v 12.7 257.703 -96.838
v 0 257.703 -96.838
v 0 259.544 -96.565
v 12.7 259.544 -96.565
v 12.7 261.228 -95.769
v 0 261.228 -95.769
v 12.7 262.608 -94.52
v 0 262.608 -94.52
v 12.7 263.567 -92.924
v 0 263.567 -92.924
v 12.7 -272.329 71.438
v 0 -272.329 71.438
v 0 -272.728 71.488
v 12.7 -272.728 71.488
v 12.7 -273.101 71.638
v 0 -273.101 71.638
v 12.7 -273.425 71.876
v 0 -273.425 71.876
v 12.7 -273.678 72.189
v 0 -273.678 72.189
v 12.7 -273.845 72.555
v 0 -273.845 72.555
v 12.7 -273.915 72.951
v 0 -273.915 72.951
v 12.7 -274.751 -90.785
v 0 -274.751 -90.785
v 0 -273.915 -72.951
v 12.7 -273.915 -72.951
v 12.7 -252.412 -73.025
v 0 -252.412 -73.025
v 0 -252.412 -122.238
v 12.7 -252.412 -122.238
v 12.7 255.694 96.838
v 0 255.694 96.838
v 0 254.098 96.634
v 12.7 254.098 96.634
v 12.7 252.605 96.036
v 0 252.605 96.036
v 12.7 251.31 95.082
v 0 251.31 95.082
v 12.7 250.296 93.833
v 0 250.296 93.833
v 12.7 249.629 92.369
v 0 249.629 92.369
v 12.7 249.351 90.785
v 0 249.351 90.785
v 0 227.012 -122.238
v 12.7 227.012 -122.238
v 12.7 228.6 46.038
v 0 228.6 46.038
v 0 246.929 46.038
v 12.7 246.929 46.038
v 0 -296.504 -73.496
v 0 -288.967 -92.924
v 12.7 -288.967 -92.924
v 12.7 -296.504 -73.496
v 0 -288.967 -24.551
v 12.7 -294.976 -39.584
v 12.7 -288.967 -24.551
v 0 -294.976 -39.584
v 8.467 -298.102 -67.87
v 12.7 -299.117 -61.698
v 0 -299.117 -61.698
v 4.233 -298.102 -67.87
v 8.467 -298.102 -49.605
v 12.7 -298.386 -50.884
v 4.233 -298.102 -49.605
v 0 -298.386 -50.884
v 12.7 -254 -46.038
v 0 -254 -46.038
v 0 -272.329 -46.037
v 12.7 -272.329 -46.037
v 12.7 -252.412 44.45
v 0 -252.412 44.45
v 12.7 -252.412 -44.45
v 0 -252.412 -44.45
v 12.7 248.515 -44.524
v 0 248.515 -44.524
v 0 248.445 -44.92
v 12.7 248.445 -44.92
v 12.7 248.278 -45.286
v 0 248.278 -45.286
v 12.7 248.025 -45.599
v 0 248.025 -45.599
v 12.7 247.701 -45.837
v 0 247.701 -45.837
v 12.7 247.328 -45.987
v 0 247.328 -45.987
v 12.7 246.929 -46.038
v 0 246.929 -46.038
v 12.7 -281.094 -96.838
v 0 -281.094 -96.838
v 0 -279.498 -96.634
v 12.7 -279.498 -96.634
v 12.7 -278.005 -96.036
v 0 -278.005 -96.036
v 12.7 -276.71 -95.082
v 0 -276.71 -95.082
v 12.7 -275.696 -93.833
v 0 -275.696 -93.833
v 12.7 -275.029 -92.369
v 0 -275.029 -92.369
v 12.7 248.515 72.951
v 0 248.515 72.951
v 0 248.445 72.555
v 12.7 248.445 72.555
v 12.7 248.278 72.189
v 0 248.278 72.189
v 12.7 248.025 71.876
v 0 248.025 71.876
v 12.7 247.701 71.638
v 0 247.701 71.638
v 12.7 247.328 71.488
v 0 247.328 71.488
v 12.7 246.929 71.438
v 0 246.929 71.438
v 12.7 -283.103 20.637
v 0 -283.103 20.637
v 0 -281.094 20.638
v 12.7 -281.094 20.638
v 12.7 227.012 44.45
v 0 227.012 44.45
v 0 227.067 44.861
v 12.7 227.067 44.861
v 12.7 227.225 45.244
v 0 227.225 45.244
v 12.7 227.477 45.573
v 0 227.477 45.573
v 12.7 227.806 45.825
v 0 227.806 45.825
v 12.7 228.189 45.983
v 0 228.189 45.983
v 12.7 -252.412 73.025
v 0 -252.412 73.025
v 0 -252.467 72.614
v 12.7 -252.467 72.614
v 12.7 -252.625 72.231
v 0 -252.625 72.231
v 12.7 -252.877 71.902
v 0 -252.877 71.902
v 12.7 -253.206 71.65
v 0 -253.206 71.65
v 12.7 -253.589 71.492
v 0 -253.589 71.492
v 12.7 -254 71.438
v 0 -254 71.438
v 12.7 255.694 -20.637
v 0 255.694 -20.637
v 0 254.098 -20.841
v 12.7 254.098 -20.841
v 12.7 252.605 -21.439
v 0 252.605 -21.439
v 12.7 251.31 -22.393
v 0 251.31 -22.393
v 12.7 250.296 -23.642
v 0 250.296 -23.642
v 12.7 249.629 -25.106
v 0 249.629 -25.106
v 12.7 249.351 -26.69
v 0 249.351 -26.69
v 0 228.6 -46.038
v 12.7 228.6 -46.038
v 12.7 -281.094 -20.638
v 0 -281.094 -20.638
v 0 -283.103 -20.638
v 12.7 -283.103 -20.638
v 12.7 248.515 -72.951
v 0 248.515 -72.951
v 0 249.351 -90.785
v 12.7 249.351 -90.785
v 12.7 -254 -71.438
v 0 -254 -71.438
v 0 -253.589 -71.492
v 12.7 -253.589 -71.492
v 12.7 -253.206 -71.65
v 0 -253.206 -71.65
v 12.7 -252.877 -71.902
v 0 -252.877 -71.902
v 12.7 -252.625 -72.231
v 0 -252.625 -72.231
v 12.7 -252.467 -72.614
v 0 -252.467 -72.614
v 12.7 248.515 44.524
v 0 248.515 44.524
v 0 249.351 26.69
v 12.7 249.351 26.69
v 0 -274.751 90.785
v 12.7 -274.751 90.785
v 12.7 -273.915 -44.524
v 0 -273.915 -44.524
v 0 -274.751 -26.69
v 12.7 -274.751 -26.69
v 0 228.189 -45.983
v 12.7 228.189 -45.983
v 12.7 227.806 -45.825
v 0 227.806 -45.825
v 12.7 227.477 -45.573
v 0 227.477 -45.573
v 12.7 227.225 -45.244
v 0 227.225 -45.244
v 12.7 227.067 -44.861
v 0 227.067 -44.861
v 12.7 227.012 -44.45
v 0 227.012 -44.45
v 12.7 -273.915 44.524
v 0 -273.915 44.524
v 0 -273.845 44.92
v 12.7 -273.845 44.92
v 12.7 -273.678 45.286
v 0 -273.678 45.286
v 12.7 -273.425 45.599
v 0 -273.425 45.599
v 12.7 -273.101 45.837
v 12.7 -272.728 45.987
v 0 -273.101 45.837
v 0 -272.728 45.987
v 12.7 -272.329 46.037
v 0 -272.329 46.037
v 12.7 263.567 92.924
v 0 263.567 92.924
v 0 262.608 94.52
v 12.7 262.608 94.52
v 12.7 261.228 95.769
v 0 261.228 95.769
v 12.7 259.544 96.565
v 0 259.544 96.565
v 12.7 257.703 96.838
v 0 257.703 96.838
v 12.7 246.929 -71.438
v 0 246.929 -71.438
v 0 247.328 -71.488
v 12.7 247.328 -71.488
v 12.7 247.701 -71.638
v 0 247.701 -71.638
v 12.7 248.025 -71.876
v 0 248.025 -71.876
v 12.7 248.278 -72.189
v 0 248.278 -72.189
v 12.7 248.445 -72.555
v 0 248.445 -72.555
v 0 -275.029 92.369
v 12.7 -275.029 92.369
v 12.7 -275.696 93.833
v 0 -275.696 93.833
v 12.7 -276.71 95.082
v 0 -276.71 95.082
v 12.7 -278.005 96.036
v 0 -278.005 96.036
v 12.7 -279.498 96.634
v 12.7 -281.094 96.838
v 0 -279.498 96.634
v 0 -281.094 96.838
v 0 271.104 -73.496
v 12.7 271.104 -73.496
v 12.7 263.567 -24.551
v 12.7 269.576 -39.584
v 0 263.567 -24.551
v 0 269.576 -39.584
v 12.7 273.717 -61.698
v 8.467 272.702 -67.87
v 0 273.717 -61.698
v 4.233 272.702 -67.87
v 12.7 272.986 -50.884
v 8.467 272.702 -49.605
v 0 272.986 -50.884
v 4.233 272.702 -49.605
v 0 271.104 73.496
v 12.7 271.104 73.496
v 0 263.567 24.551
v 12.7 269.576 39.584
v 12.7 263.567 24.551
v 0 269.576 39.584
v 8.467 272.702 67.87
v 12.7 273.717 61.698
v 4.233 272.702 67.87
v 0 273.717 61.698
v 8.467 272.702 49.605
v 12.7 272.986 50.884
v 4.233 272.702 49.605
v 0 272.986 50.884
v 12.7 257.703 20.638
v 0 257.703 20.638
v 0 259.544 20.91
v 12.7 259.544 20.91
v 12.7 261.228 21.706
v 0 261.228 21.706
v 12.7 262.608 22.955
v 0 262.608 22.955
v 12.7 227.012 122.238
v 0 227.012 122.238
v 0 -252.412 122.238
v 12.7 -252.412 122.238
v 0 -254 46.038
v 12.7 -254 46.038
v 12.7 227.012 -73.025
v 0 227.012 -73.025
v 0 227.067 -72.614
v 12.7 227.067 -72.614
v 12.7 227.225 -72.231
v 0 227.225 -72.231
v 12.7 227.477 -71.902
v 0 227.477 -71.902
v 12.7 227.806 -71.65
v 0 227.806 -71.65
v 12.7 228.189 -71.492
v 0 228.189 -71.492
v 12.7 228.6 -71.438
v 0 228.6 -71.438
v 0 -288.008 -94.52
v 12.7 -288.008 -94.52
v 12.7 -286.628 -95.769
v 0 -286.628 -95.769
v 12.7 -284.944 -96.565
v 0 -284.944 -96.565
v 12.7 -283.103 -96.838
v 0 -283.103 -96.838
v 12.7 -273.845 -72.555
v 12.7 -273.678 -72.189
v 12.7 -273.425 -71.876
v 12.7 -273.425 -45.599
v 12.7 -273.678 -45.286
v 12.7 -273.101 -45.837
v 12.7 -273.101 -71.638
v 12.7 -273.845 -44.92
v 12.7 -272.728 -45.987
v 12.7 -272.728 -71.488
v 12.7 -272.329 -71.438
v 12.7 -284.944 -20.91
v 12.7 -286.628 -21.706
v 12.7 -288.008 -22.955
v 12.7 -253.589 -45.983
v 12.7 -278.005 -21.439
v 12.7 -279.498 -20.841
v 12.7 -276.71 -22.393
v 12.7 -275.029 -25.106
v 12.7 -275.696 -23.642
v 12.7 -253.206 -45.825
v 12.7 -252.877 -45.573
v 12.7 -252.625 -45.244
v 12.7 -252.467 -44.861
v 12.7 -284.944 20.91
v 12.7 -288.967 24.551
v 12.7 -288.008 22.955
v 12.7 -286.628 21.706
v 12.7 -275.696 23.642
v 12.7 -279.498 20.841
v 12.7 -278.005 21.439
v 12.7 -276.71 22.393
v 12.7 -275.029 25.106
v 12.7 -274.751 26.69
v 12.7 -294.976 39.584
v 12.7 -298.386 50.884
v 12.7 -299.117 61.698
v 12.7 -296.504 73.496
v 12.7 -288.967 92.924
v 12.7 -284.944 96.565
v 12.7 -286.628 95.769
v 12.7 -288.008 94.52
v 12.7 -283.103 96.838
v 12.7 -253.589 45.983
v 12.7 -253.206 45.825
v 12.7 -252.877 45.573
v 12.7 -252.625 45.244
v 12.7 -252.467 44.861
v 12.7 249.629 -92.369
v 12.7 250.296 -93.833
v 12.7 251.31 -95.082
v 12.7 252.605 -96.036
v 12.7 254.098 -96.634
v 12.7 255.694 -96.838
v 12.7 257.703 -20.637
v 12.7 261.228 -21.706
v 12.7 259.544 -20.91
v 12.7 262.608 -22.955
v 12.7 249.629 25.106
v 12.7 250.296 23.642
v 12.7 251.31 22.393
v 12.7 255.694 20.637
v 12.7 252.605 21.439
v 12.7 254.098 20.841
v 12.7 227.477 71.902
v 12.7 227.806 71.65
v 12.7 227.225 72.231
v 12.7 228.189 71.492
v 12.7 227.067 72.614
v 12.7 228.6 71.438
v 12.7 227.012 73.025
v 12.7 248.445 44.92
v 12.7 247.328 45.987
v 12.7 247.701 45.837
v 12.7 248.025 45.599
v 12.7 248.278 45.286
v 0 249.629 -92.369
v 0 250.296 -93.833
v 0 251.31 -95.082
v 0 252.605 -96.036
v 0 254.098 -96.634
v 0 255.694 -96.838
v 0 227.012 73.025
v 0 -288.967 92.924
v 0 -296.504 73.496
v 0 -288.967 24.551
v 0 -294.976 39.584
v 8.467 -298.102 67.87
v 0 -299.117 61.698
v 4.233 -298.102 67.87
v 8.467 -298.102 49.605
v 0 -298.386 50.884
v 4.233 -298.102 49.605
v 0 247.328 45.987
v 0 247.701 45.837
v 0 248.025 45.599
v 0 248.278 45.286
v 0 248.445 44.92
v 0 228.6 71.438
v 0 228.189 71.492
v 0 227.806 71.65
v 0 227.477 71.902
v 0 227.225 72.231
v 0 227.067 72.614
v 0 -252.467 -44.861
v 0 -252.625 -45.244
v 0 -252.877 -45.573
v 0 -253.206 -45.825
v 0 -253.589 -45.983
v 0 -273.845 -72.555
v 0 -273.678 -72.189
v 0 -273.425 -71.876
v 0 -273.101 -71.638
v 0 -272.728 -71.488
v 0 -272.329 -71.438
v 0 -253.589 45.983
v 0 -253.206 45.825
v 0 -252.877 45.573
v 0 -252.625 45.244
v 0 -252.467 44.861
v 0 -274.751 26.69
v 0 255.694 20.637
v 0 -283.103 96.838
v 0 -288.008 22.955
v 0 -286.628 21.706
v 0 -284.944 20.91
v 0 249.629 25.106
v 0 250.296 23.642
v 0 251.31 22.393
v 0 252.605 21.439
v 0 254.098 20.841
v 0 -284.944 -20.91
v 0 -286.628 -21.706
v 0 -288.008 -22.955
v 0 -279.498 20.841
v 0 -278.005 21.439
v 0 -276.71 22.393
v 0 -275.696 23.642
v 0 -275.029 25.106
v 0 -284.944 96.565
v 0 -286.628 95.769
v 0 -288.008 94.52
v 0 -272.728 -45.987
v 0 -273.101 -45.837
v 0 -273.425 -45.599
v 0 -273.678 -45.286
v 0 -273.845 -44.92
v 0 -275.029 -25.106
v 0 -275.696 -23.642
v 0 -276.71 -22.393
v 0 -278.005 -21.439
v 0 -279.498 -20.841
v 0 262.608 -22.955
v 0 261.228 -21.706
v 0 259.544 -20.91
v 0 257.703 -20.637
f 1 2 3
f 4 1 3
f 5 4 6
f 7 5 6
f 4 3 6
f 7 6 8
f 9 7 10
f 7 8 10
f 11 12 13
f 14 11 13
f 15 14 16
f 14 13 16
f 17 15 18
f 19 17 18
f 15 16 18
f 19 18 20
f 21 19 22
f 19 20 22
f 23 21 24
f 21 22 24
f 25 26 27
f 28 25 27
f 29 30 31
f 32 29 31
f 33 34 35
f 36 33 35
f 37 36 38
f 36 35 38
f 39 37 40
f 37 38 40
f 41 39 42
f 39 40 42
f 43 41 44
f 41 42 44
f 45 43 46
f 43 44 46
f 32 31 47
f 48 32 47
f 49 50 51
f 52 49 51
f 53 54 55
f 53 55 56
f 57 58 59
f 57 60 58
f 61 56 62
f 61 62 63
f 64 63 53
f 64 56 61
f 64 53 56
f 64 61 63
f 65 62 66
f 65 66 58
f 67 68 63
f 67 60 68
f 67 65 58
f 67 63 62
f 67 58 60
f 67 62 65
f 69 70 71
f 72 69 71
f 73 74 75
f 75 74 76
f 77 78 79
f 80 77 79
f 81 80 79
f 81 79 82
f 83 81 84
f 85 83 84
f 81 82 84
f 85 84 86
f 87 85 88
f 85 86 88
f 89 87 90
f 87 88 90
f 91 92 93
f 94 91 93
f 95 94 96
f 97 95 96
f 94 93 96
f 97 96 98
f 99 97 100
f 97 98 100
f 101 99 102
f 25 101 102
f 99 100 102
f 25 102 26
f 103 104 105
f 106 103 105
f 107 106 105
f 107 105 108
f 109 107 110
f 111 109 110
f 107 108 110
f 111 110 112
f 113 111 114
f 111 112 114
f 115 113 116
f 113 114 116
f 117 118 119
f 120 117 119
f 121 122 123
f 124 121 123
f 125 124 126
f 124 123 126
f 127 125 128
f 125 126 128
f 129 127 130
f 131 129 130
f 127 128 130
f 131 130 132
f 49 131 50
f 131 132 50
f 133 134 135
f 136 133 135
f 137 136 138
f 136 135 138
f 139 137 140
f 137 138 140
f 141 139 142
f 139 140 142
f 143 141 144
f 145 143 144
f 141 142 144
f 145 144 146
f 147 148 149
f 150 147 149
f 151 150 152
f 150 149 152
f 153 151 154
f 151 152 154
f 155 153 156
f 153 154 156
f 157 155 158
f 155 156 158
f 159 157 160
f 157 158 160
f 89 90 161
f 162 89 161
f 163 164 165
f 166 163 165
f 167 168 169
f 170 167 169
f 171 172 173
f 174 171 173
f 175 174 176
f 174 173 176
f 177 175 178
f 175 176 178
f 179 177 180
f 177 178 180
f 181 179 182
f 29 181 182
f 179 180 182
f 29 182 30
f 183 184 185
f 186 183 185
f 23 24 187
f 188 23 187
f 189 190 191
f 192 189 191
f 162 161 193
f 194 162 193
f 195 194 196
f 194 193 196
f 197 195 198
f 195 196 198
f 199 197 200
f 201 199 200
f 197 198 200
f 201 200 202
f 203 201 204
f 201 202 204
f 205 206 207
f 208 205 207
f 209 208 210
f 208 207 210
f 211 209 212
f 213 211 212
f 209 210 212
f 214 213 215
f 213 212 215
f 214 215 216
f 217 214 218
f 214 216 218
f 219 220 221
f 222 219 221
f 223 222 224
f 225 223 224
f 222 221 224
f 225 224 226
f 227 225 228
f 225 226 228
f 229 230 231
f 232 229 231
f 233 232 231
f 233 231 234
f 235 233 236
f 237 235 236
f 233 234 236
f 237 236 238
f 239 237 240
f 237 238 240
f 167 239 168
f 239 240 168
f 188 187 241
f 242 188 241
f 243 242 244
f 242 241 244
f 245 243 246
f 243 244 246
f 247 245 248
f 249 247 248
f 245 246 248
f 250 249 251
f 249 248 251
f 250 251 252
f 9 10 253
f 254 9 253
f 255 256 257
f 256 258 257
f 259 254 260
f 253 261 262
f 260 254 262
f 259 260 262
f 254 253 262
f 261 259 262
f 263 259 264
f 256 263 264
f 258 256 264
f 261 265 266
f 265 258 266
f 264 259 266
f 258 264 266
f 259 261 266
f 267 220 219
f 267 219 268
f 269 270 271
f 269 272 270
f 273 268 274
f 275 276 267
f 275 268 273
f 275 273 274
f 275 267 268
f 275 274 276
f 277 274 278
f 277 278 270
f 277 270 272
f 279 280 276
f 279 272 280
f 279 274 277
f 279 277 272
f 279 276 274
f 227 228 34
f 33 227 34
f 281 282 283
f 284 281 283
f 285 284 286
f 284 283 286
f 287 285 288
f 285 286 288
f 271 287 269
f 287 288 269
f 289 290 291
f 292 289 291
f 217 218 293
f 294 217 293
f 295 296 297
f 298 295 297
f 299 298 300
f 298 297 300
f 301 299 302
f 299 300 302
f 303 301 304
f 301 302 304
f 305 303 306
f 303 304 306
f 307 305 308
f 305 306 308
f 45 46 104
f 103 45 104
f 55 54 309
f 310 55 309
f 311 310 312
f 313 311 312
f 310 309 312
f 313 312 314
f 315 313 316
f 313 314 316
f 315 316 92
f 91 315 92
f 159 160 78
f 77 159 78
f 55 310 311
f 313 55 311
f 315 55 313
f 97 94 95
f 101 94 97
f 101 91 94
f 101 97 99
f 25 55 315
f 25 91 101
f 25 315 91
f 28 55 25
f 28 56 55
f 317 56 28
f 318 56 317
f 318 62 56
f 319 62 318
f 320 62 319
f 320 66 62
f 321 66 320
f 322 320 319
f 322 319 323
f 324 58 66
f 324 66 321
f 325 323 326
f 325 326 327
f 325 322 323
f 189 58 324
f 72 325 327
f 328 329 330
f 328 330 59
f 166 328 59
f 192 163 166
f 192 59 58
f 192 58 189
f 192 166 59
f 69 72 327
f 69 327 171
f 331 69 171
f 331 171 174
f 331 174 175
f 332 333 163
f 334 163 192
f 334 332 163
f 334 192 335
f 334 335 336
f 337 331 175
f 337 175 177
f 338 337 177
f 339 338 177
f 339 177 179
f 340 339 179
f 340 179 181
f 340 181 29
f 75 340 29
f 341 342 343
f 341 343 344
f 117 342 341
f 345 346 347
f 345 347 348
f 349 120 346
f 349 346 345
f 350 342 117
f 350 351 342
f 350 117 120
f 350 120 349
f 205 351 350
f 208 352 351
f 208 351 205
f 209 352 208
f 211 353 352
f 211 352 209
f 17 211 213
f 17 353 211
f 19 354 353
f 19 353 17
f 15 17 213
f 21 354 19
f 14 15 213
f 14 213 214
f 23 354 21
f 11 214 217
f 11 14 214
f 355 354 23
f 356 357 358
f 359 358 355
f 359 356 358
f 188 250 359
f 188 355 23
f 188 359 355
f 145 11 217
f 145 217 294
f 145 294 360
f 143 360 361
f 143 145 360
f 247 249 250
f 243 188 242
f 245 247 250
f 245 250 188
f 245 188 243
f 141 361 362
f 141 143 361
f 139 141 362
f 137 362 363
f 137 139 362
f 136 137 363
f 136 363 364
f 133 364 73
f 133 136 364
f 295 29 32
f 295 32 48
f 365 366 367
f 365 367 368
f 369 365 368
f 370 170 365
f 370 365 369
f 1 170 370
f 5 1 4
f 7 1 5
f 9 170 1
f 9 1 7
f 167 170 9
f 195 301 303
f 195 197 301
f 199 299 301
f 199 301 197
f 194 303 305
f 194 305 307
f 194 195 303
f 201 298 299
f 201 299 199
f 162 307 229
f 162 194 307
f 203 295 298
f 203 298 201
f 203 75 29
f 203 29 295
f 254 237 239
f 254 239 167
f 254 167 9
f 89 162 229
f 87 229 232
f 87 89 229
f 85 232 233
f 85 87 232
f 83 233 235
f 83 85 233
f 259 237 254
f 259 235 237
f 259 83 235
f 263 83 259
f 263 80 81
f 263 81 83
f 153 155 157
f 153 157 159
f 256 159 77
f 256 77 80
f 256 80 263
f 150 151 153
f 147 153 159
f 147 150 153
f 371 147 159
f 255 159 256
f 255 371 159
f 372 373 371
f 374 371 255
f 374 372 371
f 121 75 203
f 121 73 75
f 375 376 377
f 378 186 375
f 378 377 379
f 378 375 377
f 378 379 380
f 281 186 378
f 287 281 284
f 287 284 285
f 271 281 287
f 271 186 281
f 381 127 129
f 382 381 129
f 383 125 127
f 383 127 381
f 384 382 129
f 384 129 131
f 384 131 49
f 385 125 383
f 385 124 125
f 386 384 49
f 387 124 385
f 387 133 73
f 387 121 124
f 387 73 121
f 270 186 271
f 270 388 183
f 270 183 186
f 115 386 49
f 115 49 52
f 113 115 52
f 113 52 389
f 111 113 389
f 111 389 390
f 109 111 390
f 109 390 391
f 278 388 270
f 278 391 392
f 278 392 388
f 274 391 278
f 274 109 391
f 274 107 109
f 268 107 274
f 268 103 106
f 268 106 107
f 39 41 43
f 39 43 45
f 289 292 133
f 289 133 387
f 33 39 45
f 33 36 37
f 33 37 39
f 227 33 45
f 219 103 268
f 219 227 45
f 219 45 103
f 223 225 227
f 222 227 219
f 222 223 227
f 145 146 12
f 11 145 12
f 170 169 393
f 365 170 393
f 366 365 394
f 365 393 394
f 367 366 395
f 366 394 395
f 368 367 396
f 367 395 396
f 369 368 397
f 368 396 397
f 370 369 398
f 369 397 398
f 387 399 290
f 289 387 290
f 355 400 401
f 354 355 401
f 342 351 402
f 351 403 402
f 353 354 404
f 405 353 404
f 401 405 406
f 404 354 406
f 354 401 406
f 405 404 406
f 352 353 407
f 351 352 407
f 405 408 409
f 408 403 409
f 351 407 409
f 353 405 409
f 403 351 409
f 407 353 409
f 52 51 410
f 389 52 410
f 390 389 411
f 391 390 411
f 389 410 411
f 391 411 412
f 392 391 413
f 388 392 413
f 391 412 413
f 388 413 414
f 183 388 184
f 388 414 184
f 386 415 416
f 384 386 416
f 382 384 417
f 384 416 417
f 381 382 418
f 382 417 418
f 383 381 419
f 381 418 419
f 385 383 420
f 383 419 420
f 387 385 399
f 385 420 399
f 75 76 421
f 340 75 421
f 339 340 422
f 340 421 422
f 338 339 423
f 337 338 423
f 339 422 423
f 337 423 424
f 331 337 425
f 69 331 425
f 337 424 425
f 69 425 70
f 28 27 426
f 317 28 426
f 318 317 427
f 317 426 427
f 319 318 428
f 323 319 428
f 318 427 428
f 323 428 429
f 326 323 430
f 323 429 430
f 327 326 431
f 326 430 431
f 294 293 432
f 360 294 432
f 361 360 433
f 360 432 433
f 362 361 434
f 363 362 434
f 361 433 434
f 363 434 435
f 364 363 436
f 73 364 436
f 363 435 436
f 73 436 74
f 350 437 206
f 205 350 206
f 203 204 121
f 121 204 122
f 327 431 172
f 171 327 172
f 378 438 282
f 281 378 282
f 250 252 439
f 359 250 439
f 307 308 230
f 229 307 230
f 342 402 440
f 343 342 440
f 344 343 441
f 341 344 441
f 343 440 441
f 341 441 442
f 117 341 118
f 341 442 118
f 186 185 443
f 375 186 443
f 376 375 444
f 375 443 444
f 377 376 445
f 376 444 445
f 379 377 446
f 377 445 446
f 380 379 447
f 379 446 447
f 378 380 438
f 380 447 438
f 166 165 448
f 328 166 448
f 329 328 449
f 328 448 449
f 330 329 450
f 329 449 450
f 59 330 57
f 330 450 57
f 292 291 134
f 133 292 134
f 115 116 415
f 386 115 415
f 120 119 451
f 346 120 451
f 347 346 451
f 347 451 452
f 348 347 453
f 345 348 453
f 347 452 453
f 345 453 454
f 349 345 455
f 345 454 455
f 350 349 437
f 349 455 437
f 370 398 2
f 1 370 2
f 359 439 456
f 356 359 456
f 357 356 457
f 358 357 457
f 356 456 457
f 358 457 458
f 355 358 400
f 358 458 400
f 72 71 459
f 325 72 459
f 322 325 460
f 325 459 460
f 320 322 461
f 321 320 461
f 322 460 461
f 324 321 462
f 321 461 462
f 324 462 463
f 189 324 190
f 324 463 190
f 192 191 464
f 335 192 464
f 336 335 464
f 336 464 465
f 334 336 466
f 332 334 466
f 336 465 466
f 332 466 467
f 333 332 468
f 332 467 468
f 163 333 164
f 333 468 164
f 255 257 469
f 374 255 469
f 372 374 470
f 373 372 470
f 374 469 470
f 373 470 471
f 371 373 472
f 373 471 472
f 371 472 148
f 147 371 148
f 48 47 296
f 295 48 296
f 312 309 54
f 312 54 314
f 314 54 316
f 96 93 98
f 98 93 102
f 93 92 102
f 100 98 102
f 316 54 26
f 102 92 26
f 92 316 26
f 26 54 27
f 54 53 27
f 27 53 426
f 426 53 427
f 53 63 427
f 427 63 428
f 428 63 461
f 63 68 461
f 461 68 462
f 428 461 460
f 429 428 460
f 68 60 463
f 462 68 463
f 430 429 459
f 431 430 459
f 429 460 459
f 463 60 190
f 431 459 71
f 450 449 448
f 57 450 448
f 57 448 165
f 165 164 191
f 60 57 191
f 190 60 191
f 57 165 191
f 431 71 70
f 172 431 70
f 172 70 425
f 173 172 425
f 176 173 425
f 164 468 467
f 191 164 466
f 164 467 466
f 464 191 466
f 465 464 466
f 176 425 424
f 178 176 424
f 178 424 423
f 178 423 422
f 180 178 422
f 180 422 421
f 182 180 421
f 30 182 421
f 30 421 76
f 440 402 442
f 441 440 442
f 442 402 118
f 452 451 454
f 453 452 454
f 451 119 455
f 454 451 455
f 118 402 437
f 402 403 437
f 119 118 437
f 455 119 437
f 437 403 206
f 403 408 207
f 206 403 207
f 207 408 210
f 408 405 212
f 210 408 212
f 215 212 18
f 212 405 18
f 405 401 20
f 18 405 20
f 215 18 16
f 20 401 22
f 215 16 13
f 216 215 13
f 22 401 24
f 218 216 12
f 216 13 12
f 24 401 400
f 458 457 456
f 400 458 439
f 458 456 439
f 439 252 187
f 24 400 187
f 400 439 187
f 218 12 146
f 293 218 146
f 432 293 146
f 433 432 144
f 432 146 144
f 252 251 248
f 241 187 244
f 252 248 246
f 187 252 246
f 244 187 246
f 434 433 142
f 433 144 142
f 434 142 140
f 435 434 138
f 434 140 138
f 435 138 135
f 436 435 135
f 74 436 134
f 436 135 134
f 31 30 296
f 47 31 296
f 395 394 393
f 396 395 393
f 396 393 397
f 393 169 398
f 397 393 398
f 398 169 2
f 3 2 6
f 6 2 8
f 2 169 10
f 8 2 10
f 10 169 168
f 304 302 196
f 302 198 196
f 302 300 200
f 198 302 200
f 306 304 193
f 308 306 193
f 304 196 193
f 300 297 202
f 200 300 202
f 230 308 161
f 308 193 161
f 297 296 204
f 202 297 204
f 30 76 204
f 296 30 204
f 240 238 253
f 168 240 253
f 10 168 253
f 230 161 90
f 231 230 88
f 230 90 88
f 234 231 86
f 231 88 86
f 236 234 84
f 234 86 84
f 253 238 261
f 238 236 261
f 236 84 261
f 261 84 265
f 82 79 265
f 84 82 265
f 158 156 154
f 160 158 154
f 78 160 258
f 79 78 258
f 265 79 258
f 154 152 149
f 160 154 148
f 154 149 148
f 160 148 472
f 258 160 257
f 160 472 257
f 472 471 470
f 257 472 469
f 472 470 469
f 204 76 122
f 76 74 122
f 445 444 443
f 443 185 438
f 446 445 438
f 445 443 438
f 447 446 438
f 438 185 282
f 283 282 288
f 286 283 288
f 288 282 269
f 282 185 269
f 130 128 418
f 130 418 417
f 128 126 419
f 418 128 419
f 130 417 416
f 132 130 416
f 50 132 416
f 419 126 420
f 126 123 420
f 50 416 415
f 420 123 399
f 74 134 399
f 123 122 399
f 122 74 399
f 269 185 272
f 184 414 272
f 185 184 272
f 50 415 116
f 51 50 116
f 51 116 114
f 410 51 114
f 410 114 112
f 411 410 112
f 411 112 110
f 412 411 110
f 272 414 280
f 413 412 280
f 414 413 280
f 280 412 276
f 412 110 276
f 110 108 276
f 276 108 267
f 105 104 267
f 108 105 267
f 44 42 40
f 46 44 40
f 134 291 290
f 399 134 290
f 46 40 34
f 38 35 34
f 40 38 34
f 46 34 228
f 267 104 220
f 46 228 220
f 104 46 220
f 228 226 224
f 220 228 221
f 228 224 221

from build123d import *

# Parameters (mm, degrees)
F1_DEPTH = 12.7


with BuildPart() as f1:
    # F0 (on Right) → F1 (new body)
    with BuildSketch(Plane.YZ):
        with BuildLine():
            ThreePointArc((-274.750656, 90.78483), (-276.709945, 95.081547), (-281.093691, 96.8375))
            Line((-281.093691, 96.8375), (-283.102754, 96.8375))
            ThreePointArc((-283.102754, 96.8375), (-286.627633, 95.76933), (-288.966632, 92.924185))
            add(Edge.make_bspline(
                [(-288.966632, 92.924185), (-302.669456, 59.948361), (-302.669456, 57.526639), (-288.966632, 24.550815)],
                knots=[2.702454, 2.702454, 2.702454, 2.702454, 73.497546, 73.497546, 73.497546, 73.497546], degree=3))
            ThreePointArc((-288.966632, 24.550815), (-286.627633, 21.70567), (-283.102754, 20.6375))
            Line((-283.102754, 20.6375), (-281.093691, 20.6375))
            ThreePointArc((-281.093691, 20.6375), (-276.709945, 22.393453), (-274.750656, 26.69017))
            Line((-274.750656, 26.69017), (-273.91468, 44.524332))
            ThreePointArc((-273.91468, 44.524332), (-273.424857, 45.598512), (-272.328921, 46.0375))
            Line((-272.328921, 46.0375), (-254, 46.0375))
            ThreePointArc((-254, 46.0375), (-252.877468, 45.572532), (-252.4125, 44.45))
            Line((-252.4125, 44.45), (-252.4125, -44.45))
            ThreePointArc((-252.4125, -44.45), (-252.877468, -45.572532), (-254, -46.0375))
            Line((-254, -46.0375), (-272.328921, -46.0375))
            ThreePointArc((-272.328921, -46.0375), (-273.424857, -45.598512), (-273.91468, -44.524332))
            Line((-273.91468, -44.524332), (-274.750656, -26.69017))
            ThreePointArc((-274.750656, -26.69017), (-276.709945, -22.393453), (-281.093691, -20.6375))
            Line((-281.093691, -20.6375), (-283.102754, -20.6375))
            ThreePointArc((-283.102754, -20.6375), (-286.627633, -21.70567), (-288.966632, -24.550815))
            add(Edge.make_bspline(
                [(-288.966632, -92.924185), (-302.669456, -59.948361), (-302.669456, -57.526639), (-288.966632, -24.550815)],
                knots=[2.702454, 2.702454, 2.702454, 2.702454, 73.497546, 73.497546, 73.497546, 73.497546], degree=3))
            ThreePointArc((-288.966632, -92.924185), (-286.627633, -95.76933), (-283.102754, -96.8375))
            Line((-283.102754, -96.8375), (-281.093691, -96.8375))
            ThreePointArc((-281.093691, -96.8375), (-276.709945, -95.081547), (-274.750656, -90.78483))
            Line((-274.750656, -90.78483), (-273.91468, -72.950668))
            ThreePointArc((-273.91468, -72.950668), (-273.424857, -71.876488), (-272.328921, -71.4375))
            Line((-272.328921, -71.4375), (-254, -71.4375))
            ThreePointArc((-254, -71.4375), (-252.877468, -71.902468), (-252.4125, -73.025))
            Line((-252.4125, -73.025), (-252.4125, -122.2375))
            Line((-252.4125, -122.2375), (227.0125, -122.2375))
            Line((227.0125, -122.2375), (227.0125, -73.025))
            ThreePointArc((227.0125, -73.025), (227.477468, -71.902468), (228.6, -71.4375))
            Line((228.6, -71.4375), (246.928921, -71.4375))
            ThreePointArc((246.928921, -71.4375), (248.024857, -71.876488), (248.51468, -72.950668))
            Line((248.51468, -72.950668), (249.350656, -90.78483))
            ThreePointArc((249.350656, -90.78483), (251.309945, -95.081547), (255.693691, -96.8375))
            Line((255.693691, -96.8375), (257.702754, -96.8375))
            ThreePointArc((257.702754, -96.8375), (261.227633, -95.76933), (263.566632, -92.924185))
            add(Edge.make_bspline(
                [(263.566632, -92.924185), (277.269456, -59.948361), (277.269456, -57.526639), (263.566632, -24.550815)],
                knots=[2.702454, 2.702454, 2.702454, 2.702454, 73.497546, 73.497546, 73.497546, 73.497546], degree=3))
            ThreePointArc((263.566632, -24.550815), (261.227633, -21.70567), (257.702754, -20.6375))
            Line((257.702754, -20.6375), (255.693691, -20.6375))
            ThreePointArc((255.693691, -20.6375), (251.309945, -22.393453), (249.350656, -26.69017))
            Line((249.350656, -26.69017), (248.51468, -44.524332))
            ThreePointArc((248.51468, -44.524332), (248.024857, -45.598512), (246.928921, -46.0375))
            Line((246.928921, -46.0375), (228.6, -46.0375))
            ThreePointArc((228.6, -46.0375), (227.477468, -45.572532), (227.0125, -44.45))
            Line((227.0125, -44.45), (227.0125, 44.45))
            ThreePointArc((227.0125, 44.45), (227.477468, 45.572532), (228.6, 46.0375))
            Line((228.6, 46.0375), (246.928921, 46.0375))
            ThreePointArc((246.928921, 46.0375), (248.024857, 45.598512), (248.51468, 44.524332))
            Line((248.51468, 44.524332), (249.350656, 26.69017))
            ThreePointArc((249.350656, 26.69017), (251.309945, 22.393453), (255.693691, 20.6375))
            Line((255.693691, 20.6375), (257.702754, 20.6375))
            ThreePointArc((257.702754, 20.6375), (261.227633, 21.70567), (263.566632, 24.550815))
            add(Edge.make_bspline(
                [(263.566632, 92.924185), (277.269456, 59.948361), (277.269456, 57.526639), (263.566632, 24.550815)],
                knots=[2.702454, 2.702454, 2.702454, 2.702454, 73.497546, 73.497546, 73.497546, 73.497546], degree=3))
            ThreePointArc((263.566632, 92.924185), (261.227633, 95.76933), (257.702754, 96.8375))
            Line((257.702754, 96.8375), (255.693691, 96.8375))
            ThreePointArc((255.693691, 96.8375), (251.309945, 95.081547), (249.350656, 90.78483))
            Line((249.350656, 90.78483), (248.51468, 72.950668))
            ThreePointArc((248.51468, 72.950668), (248.024857, 71.876488), (246.928921, 71.4375))
            Line((246.928921, 71.4375), (228.6, 71.4375))
            ThreePointArc((228.6, 71.4375), (227.477468, 71.902468), (227.0125, 73.025))
            Line((227.0125, 73.025), (227.0125, 122.2375))
            Line((227.0125, 122.2375), (-252.4125, 122.2375))
            Line((-252.4125, 122.2375), (-252.4125, 73.025))
            ThreePointArc((-252.4125, 73.025), (-252.877468, 71.902468), (-254, 71.4375))
            Line((-254, 71.4375), (-272.328921, 71.4375))
            ThreePointArc((-272.328921, 71.4375), (-273.424857, 71.876488), (-273.91468, 72.950668))
            Line((-273.91468, 72.950668), (-274.750656, 90.78483))
        make_face()
    extrude(amount=F1_DEPTH)


solid = f1.part
